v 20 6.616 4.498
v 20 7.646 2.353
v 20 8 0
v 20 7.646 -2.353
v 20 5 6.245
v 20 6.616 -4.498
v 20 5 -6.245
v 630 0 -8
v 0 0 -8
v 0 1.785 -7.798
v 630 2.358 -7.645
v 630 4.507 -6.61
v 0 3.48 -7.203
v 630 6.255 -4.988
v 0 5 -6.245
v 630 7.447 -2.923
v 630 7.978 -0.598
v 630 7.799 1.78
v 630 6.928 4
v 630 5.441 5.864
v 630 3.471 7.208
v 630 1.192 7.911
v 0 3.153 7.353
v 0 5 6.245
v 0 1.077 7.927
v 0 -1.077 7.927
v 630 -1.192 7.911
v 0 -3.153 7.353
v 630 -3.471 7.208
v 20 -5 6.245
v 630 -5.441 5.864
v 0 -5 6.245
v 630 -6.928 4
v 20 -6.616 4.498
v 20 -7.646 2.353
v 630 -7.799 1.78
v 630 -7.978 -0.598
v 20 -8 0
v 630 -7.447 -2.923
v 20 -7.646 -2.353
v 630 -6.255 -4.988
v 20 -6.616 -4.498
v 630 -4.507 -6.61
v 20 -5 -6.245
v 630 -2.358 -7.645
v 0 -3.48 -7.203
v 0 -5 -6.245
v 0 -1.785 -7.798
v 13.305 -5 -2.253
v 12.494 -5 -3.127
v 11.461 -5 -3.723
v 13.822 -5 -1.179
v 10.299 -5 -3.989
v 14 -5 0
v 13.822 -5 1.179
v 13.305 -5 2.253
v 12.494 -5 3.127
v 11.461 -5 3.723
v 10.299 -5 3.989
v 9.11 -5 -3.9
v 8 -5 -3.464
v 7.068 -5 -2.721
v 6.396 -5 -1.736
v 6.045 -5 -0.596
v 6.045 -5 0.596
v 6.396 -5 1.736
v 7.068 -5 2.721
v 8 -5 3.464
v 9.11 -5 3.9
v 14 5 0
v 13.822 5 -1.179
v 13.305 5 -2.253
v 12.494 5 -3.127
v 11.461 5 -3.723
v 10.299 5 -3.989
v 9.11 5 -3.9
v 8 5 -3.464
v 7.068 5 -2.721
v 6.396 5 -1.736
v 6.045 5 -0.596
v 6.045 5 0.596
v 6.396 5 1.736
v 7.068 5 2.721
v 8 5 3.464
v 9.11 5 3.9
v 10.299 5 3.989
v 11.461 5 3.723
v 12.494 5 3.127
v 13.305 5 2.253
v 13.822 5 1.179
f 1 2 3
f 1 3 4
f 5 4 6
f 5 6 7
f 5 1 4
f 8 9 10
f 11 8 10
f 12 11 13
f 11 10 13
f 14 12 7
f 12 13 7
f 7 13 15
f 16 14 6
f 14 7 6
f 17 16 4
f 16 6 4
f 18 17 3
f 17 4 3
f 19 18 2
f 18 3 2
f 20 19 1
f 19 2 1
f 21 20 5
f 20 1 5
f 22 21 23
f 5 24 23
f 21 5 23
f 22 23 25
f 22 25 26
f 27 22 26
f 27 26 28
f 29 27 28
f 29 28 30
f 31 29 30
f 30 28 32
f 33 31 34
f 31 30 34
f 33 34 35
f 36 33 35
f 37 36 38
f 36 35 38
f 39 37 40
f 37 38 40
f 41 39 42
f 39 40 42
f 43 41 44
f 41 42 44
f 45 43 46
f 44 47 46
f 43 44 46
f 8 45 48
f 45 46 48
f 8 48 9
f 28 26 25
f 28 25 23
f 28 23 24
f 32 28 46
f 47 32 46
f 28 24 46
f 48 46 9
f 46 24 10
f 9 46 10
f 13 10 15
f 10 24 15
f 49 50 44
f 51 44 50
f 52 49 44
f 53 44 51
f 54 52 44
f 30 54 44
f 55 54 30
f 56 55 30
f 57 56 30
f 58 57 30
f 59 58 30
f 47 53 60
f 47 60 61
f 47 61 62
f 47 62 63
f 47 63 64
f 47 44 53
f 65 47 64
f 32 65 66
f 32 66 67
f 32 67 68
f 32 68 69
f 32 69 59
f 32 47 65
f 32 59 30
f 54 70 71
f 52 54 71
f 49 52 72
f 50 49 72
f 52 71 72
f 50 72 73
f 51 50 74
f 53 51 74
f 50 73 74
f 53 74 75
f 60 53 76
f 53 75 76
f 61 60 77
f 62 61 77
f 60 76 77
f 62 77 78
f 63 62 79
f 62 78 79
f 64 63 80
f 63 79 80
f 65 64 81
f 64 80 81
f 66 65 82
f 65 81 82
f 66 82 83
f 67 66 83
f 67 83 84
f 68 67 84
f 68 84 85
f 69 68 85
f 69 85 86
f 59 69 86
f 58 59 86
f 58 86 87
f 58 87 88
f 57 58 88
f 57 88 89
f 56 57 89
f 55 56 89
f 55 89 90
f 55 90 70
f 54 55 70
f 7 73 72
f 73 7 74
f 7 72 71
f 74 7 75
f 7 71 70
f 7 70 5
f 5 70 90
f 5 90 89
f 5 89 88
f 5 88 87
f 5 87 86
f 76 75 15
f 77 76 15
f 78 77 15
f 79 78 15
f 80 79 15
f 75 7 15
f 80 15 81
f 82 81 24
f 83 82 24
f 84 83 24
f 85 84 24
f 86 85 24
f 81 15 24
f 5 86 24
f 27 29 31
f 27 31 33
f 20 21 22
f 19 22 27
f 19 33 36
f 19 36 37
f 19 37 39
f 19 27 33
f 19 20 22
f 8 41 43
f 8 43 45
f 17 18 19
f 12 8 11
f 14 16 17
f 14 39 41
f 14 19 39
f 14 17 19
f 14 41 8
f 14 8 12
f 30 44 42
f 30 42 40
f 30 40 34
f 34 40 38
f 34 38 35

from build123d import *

# Parameters (mm, degrees)
SKETCH_1_R           = 8
EXTRUDE_1_DEPTH      = 630
SKETCH_3_OUTSIDE_W   = 144.082
SKETCH_3_OUTSIDE_H   = 144.082
SKETCH_3_OUTSIDE_W_2 = 20
SKETCH_3_OUTSIDE_H_2 = 10
CUT_EXTRUDE_2_DEPTH  = 20
SKETCH_4_R           = 4
CUT_EXTRUDE_3_DEPTH  = 14


with BuildPart() as part:
    # 草图1 → 凸台-拉伸1 (new body)
    with BuildSketch(Plane(origin=(0, 0, 0), x_dir=(0, 0, -1), z_dir=(1, 0, 0))):
        Circle(SKETCH_1_R)
    extrude(amount=EXTRUDE_1_DEPTH)

    # 草图3 outside → 切除-拉伸2 (cut)
    with BuildSketch(Plane.ZY):
        Rectangle(SKETCH_3_OUTSIDE_W, SKETCH_3_OUTSIDE_H)
        Rectangle(SKETCH_3_OUTSIDE_W_2, SKETCH_3_OUTSIDE_H_2, mode=Mode.SUBTRACT)
    extrude(amount=-CUT_EXTRUDE_2_DEPTH, mode=Mode.SUBTRACT)

    # 草图4 → 切除-拉伸3 (cut, through all)
    with BuildSketch(Plane(origin=(0, 5, 0), x_dir=(1, 0, 0), z_dir=(0, 1, 0))):
        with Locations((10, 0)):
            Circle(SKETCH_4_R)
    extrude(amount=-CUT_EXTRUDE_3_DEPTH, mode=Mode.SUBTRACT)


solid = part.part
